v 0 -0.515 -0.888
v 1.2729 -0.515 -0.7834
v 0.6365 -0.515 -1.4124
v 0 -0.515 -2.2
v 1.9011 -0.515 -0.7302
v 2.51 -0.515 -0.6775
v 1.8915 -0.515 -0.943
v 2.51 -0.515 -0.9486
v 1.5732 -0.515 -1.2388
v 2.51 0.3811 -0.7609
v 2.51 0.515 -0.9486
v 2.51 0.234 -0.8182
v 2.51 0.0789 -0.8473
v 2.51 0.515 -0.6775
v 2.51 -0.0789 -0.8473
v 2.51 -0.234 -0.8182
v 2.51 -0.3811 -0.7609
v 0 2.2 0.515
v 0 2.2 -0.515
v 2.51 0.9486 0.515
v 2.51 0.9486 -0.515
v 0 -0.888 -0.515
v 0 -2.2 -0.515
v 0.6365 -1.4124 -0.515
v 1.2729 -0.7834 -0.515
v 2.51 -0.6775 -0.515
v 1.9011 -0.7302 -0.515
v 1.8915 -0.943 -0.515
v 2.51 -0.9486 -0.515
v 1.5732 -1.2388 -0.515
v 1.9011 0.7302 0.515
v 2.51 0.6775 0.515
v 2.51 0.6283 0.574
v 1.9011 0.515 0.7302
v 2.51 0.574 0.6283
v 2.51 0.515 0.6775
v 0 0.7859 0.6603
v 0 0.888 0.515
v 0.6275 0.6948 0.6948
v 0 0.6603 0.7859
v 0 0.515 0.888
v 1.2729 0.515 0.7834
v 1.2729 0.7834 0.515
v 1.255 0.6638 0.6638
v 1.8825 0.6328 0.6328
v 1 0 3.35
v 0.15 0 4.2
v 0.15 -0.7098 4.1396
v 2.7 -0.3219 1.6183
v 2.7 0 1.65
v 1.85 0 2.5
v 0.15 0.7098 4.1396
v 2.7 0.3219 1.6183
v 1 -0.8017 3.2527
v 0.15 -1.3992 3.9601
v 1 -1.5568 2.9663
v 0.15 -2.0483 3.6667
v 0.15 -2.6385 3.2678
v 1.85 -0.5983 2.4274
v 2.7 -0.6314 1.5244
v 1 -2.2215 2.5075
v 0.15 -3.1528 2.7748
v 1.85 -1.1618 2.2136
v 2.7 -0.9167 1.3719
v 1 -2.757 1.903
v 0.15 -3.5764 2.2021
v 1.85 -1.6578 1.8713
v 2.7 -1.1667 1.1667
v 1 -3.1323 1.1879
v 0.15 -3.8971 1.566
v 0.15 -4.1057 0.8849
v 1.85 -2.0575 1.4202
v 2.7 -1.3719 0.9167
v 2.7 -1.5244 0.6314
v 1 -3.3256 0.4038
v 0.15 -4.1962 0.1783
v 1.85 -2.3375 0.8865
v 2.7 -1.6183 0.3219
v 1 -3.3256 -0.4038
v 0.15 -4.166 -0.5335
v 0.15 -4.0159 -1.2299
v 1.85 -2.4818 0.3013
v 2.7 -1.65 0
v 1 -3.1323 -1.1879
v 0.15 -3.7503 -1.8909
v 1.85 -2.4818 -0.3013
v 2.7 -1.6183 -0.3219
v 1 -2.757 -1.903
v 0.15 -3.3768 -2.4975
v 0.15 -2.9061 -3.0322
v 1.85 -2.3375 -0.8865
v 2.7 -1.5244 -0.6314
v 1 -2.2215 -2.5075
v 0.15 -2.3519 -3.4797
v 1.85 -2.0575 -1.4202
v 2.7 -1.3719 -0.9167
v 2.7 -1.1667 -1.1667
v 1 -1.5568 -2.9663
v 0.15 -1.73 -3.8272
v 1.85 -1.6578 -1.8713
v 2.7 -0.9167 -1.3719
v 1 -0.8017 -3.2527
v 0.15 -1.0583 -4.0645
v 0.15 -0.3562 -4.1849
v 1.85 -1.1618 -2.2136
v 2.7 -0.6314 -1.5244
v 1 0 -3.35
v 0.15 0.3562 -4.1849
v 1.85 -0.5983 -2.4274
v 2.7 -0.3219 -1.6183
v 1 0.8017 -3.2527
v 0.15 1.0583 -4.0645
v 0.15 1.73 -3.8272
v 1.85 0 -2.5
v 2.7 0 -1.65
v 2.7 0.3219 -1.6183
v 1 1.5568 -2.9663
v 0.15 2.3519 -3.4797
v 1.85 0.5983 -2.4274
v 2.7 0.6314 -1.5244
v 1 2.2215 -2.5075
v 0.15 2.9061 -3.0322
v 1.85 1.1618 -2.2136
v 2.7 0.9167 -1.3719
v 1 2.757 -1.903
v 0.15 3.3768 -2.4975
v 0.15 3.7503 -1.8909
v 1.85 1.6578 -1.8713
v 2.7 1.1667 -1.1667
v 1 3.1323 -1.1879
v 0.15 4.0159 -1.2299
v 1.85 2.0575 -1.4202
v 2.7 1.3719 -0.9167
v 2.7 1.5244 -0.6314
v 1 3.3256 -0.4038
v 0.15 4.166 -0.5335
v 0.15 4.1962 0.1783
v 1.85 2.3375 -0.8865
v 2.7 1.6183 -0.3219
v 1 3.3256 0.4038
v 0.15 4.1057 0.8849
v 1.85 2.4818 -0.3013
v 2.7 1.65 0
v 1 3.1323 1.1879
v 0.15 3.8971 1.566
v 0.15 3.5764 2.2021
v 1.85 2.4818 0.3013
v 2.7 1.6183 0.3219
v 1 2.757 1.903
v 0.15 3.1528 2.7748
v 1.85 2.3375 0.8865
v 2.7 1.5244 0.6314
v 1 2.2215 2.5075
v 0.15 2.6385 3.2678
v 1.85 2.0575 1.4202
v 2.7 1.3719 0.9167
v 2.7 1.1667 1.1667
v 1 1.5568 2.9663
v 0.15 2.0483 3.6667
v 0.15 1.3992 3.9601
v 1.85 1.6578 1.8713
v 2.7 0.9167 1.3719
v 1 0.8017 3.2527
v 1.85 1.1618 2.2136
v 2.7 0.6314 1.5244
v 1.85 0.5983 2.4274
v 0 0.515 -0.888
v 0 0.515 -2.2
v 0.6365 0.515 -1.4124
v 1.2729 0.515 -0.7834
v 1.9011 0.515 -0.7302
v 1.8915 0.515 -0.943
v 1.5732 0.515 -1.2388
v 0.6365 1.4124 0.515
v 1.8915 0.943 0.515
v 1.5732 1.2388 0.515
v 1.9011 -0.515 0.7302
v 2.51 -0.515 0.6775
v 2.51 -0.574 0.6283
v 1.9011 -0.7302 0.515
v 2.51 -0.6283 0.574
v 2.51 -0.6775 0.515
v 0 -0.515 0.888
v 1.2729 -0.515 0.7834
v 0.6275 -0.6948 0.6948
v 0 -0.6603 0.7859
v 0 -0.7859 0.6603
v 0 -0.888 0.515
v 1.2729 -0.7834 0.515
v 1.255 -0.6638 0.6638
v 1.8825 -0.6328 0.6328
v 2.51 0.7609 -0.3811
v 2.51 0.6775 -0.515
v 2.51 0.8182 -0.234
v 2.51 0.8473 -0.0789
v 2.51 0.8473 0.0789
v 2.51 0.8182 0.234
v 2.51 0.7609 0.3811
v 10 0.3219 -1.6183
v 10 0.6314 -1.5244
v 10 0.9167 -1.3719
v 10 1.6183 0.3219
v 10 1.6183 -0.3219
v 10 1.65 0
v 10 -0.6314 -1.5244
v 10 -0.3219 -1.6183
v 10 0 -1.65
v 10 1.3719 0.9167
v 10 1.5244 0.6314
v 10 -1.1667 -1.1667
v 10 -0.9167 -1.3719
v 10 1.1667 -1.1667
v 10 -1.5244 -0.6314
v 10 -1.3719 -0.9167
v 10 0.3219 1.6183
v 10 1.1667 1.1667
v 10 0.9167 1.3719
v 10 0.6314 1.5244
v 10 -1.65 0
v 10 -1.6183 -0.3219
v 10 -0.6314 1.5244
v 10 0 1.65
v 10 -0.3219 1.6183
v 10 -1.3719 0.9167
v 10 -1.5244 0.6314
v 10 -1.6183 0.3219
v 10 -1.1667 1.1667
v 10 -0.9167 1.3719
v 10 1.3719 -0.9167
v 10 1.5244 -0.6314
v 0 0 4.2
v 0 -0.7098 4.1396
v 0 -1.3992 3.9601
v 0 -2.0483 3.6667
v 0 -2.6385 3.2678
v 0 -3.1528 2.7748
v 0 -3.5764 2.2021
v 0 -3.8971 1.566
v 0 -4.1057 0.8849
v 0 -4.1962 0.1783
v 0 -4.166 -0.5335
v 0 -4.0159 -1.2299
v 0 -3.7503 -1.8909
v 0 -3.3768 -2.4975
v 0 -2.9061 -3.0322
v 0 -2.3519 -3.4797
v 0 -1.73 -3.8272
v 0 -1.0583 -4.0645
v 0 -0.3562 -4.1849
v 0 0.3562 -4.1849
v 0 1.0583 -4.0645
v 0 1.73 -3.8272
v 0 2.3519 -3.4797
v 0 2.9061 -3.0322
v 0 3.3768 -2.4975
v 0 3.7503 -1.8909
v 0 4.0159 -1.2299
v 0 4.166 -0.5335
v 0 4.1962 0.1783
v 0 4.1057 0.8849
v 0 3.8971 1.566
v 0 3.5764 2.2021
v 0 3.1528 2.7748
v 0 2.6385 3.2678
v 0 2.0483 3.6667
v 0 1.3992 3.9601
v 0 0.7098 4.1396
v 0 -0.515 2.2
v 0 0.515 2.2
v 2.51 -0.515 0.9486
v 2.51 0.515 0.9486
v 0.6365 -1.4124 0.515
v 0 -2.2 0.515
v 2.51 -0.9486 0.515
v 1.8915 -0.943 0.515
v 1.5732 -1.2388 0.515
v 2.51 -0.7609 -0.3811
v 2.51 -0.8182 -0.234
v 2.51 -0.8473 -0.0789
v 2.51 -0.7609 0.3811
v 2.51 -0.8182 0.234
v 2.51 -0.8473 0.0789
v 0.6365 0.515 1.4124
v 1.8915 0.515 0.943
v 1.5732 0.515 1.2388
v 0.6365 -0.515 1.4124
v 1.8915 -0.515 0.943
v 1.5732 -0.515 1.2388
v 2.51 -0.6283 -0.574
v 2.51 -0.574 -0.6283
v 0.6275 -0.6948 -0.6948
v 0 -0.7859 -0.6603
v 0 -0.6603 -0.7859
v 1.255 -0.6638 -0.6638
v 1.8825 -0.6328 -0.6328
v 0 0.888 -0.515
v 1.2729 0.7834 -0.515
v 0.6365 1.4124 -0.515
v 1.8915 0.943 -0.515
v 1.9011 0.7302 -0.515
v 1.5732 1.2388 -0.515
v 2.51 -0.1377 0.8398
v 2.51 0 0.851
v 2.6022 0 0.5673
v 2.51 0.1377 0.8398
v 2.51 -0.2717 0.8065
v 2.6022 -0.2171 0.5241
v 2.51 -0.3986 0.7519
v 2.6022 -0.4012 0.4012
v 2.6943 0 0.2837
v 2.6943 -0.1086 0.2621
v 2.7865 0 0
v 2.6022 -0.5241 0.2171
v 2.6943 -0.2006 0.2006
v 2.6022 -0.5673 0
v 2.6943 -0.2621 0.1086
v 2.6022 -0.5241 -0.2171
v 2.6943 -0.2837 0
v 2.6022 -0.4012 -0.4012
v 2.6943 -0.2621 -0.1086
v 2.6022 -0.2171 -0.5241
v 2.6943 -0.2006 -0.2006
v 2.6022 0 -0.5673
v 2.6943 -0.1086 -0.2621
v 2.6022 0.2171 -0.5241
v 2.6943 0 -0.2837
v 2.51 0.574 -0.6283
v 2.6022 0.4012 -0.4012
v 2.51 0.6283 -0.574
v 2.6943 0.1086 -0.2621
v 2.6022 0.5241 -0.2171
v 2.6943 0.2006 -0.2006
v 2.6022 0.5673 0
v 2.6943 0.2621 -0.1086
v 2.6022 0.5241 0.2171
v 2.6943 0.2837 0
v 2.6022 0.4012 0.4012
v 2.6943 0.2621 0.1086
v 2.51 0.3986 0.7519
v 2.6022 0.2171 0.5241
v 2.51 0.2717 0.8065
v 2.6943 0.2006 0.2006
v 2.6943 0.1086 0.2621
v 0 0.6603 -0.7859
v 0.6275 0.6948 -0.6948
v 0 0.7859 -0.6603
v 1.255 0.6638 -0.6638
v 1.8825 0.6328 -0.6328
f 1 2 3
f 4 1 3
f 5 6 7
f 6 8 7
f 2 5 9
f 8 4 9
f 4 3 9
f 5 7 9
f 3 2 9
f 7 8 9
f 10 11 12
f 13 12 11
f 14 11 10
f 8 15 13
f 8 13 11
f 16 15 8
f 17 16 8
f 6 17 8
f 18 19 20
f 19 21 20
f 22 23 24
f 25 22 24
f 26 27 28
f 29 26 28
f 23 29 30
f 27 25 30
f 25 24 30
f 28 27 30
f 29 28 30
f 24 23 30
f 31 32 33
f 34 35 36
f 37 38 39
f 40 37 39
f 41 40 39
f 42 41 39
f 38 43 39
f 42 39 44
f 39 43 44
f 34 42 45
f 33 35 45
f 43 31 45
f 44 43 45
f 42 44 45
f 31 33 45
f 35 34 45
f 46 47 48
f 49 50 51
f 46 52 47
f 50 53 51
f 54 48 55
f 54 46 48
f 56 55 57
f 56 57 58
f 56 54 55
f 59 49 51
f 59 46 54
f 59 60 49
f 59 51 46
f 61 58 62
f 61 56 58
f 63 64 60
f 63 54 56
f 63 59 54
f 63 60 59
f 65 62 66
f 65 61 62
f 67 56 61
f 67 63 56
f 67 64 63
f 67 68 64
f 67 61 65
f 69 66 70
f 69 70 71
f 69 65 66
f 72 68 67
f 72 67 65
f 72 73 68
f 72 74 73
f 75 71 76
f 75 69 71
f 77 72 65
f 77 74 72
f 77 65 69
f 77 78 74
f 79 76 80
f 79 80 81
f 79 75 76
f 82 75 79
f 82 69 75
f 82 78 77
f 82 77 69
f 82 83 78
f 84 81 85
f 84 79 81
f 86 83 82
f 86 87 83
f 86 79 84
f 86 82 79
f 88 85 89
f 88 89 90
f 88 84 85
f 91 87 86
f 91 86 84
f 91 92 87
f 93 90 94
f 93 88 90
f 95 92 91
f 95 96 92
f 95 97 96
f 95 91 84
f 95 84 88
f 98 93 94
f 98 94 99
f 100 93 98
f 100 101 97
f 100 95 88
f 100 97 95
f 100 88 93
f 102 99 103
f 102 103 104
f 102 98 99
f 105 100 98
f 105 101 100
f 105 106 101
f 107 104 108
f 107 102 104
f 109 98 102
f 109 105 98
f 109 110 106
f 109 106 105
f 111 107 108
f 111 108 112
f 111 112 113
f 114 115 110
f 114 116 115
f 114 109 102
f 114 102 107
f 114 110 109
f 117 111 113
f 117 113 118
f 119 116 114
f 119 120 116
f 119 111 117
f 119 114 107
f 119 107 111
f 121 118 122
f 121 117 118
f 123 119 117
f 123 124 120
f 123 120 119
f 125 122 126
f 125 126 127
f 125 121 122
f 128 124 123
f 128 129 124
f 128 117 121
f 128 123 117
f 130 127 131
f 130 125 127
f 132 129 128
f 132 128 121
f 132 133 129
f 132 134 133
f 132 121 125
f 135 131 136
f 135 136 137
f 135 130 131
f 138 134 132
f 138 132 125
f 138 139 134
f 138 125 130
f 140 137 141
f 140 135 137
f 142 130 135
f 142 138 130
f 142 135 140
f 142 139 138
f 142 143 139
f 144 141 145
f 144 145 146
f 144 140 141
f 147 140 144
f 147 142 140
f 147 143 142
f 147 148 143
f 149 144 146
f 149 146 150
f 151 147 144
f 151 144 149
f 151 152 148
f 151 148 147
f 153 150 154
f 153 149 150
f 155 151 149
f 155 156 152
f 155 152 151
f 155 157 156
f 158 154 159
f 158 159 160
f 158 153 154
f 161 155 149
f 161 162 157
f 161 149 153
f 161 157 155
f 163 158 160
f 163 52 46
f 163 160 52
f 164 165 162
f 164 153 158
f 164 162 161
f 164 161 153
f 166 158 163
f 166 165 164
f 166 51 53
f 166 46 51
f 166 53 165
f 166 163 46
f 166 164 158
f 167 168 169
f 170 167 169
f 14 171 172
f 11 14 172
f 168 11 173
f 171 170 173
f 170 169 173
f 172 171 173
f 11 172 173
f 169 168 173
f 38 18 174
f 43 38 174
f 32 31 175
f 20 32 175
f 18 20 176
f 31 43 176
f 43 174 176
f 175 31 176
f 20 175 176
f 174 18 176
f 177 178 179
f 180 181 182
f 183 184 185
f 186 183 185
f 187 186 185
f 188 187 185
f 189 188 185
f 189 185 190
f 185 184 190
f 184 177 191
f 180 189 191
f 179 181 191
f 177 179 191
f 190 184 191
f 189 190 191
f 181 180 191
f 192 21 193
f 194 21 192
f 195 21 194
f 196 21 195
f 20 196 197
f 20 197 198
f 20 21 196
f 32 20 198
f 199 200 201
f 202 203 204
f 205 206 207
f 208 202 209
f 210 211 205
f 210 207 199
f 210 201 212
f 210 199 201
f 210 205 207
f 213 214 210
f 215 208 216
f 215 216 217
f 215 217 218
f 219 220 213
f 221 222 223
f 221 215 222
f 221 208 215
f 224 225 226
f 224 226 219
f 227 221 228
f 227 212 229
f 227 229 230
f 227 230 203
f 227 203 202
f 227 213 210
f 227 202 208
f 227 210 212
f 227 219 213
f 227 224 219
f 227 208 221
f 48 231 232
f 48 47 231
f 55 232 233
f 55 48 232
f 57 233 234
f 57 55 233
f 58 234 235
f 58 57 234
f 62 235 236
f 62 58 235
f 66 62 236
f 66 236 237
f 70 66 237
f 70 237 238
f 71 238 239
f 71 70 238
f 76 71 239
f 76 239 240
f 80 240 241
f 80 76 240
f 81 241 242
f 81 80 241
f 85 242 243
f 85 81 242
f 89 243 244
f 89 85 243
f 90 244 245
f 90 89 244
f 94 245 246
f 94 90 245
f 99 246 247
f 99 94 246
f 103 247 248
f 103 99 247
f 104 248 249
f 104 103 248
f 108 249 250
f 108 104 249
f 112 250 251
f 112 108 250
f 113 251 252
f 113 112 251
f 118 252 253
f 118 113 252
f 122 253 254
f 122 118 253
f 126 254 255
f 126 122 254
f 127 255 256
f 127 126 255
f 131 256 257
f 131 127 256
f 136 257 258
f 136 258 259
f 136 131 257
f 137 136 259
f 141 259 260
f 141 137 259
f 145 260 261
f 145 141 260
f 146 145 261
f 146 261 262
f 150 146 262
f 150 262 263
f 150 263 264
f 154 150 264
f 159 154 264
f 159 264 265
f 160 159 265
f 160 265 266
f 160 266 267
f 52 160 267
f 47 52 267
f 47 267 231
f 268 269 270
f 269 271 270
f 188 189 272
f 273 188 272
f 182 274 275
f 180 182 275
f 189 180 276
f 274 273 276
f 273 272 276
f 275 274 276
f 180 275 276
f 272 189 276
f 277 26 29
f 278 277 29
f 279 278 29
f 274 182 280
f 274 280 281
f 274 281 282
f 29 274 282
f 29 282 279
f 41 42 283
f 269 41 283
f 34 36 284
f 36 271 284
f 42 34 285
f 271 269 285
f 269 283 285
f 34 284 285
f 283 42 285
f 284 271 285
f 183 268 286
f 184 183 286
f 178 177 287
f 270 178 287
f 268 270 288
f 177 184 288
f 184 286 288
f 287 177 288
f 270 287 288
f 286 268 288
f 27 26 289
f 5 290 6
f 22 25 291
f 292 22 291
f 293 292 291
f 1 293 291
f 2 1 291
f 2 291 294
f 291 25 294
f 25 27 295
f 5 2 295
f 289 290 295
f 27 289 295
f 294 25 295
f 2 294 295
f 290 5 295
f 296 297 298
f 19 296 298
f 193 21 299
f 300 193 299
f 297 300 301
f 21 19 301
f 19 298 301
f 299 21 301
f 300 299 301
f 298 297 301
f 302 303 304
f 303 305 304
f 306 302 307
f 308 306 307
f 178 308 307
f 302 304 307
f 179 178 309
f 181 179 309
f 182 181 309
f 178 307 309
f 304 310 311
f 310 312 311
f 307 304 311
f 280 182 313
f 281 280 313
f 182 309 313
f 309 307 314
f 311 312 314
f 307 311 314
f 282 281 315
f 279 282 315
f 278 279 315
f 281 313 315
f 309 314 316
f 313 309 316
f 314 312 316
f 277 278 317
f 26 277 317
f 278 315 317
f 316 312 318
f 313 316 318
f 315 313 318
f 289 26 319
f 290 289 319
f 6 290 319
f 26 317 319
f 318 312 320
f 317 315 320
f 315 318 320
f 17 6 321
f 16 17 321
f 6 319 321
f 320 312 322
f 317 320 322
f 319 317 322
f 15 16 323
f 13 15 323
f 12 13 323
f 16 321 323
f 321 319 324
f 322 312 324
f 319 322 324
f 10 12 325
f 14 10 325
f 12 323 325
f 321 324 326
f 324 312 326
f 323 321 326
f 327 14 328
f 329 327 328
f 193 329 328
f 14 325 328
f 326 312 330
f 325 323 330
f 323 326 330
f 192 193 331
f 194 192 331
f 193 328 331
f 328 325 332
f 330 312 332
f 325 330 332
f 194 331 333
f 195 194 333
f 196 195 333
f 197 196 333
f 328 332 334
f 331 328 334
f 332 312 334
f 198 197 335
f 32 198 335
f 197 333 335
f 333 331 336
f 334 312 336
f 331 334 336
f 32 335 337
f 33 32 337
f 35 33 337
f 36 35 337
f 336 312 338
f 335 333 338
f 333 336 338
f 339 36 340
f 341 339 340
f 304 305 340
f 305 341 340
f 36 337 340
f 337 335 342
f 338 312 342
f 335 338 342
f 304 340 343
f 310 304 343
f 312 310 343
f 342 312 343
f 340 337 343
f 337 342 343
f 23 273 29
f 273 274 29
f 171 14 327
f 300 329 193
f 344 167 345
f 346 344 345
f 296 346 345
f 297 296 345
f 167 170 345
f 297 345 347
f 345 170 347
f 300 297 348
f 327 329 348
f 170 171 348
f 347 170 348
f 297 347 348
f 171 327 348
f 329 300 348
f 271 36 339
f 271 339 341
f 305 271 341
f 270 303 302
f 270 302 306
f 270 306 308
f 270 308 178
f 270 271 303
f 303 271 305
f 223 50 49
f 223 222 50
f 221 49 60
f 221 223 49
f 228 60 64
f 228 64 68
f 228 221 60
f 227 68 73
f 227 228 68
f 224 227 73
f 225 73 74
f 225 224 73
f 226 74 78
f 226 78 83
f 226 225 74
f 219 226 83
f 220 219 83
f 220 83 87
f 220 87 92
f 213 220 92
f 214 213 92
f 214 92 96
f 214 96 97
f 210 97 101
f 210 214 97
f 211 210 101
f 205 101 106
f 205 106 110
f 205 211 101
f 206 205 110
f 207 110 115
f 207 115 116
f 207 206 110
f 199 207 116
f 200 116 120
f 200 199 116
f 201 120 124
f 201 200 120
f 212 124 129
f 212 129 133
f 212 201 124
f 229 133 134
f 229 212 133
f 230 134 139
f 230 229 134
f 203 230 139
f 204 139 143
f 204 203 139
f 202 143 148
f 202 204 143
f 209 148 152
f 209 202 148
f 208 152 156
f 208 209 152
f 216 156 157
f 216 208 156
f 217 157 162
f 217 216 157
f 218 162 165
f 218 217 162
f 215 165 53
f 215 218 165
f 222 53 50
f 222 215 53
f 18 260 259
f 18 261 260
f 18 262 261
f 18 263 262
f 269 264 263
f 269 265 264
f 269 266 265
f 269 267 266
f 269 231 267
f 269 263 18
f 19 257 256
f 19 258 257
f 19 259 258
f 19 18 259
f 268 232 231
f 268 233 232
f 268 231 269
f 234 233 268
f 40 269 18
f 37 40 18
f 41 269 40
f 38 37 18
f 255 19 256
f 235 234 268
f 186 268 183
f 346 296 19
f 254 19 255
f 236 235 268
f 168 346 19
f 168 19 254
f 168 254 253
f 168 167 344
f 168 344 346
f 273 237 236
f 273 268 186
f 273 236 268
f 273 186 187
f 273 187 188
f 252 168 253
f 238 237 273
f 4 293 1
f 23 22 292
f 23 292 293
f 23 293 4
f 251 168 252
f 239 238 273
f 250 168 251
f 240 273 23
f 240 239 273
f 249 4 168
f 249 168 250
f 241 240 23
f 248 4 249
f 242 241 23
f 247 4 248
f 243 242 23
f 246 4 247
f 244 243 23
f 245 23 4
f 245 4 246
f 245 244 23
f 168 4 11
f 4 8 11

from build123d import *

# Parameters (mm, degrees)
RECPAT_COUNT = 2
RECPAT_ANGLE = 90


with BuildPart() as part:
    # BodySke → Base-Revolve (revolve)
    with BuildSketch(Plane.XY, mode=Mode.PRIVATE) as base_revolve_sk:
        Polygon((0, 0), (0, 4.2), (0.15, 4.2), (2.7, 1.65), (10, 1.65), (10, 0), align=None)
    revolve(base_revolve_sk.sketch.rotate(Axis((-6.35, 0, 0), (1, 0, 0)), 90), axis=Axis((-6.35, 0, 0), (1, 0, 0)))

    # Sketch3 → Recess section 0
    with BuildSketch(Plane.ZY):
        with BuildLine():
            Line((-0.515, 2.2), (0.515, 2.2))
            Line((0.515, 2.2), (0.515, -2.2))
            Line((0.515, -2.2), (-0.515, -2.2))
            Line((-0.515, -2.2), (-0.515, 2.2))
        make_face()
    # Sketch4 → Recess section 1
    with BuildSketch(Plane.ZY.offset(-2.51)):
        with BuildLine():
            Line((-0.515, 0.948560373), (0.515, 0.948560373))
            Line((0.515, 0.948560373), (0.515, -0.948560373))
            Line((0.515, -0.948560373), (-0.515, -0.948560373))
            Line((-0.515, -0.948560373), (-0.515, 0.948560373))
        make_face()
    recess = loft(mode=Mode.SUBTRACT)

    # RecPat: Recess ×2 about axis
    recpat_axis = Axis((0, 0, 0), (1, 0, 0))
    for i in range(1, RECPAT_COUNT):
        add(recess.rotate(recpat_axis, i * RECPAT_ANGLE / (RECPAT_COUNT - 1)), mode=Mode.SUBTRACT)

    # RecCorSke → RecessCore (revolve, cut)
    with BuildSketch(Plane.XY, mode=Mode.PRIVATE) as recesscore_sk:
        Polygon((0, 0), (0, 1.026516298), (2.51, 0.851), (2.786506661, 0), align=None)
    revolve(recesscore_sk.sketch.rotate(Axis((-3.175, 0, 0), (1, 0, 0)), 90), axis=Axis((-3.175, 0, 0), (1, 0, 0)), mode=Mode.SUBTRACT)


solid = part.part
